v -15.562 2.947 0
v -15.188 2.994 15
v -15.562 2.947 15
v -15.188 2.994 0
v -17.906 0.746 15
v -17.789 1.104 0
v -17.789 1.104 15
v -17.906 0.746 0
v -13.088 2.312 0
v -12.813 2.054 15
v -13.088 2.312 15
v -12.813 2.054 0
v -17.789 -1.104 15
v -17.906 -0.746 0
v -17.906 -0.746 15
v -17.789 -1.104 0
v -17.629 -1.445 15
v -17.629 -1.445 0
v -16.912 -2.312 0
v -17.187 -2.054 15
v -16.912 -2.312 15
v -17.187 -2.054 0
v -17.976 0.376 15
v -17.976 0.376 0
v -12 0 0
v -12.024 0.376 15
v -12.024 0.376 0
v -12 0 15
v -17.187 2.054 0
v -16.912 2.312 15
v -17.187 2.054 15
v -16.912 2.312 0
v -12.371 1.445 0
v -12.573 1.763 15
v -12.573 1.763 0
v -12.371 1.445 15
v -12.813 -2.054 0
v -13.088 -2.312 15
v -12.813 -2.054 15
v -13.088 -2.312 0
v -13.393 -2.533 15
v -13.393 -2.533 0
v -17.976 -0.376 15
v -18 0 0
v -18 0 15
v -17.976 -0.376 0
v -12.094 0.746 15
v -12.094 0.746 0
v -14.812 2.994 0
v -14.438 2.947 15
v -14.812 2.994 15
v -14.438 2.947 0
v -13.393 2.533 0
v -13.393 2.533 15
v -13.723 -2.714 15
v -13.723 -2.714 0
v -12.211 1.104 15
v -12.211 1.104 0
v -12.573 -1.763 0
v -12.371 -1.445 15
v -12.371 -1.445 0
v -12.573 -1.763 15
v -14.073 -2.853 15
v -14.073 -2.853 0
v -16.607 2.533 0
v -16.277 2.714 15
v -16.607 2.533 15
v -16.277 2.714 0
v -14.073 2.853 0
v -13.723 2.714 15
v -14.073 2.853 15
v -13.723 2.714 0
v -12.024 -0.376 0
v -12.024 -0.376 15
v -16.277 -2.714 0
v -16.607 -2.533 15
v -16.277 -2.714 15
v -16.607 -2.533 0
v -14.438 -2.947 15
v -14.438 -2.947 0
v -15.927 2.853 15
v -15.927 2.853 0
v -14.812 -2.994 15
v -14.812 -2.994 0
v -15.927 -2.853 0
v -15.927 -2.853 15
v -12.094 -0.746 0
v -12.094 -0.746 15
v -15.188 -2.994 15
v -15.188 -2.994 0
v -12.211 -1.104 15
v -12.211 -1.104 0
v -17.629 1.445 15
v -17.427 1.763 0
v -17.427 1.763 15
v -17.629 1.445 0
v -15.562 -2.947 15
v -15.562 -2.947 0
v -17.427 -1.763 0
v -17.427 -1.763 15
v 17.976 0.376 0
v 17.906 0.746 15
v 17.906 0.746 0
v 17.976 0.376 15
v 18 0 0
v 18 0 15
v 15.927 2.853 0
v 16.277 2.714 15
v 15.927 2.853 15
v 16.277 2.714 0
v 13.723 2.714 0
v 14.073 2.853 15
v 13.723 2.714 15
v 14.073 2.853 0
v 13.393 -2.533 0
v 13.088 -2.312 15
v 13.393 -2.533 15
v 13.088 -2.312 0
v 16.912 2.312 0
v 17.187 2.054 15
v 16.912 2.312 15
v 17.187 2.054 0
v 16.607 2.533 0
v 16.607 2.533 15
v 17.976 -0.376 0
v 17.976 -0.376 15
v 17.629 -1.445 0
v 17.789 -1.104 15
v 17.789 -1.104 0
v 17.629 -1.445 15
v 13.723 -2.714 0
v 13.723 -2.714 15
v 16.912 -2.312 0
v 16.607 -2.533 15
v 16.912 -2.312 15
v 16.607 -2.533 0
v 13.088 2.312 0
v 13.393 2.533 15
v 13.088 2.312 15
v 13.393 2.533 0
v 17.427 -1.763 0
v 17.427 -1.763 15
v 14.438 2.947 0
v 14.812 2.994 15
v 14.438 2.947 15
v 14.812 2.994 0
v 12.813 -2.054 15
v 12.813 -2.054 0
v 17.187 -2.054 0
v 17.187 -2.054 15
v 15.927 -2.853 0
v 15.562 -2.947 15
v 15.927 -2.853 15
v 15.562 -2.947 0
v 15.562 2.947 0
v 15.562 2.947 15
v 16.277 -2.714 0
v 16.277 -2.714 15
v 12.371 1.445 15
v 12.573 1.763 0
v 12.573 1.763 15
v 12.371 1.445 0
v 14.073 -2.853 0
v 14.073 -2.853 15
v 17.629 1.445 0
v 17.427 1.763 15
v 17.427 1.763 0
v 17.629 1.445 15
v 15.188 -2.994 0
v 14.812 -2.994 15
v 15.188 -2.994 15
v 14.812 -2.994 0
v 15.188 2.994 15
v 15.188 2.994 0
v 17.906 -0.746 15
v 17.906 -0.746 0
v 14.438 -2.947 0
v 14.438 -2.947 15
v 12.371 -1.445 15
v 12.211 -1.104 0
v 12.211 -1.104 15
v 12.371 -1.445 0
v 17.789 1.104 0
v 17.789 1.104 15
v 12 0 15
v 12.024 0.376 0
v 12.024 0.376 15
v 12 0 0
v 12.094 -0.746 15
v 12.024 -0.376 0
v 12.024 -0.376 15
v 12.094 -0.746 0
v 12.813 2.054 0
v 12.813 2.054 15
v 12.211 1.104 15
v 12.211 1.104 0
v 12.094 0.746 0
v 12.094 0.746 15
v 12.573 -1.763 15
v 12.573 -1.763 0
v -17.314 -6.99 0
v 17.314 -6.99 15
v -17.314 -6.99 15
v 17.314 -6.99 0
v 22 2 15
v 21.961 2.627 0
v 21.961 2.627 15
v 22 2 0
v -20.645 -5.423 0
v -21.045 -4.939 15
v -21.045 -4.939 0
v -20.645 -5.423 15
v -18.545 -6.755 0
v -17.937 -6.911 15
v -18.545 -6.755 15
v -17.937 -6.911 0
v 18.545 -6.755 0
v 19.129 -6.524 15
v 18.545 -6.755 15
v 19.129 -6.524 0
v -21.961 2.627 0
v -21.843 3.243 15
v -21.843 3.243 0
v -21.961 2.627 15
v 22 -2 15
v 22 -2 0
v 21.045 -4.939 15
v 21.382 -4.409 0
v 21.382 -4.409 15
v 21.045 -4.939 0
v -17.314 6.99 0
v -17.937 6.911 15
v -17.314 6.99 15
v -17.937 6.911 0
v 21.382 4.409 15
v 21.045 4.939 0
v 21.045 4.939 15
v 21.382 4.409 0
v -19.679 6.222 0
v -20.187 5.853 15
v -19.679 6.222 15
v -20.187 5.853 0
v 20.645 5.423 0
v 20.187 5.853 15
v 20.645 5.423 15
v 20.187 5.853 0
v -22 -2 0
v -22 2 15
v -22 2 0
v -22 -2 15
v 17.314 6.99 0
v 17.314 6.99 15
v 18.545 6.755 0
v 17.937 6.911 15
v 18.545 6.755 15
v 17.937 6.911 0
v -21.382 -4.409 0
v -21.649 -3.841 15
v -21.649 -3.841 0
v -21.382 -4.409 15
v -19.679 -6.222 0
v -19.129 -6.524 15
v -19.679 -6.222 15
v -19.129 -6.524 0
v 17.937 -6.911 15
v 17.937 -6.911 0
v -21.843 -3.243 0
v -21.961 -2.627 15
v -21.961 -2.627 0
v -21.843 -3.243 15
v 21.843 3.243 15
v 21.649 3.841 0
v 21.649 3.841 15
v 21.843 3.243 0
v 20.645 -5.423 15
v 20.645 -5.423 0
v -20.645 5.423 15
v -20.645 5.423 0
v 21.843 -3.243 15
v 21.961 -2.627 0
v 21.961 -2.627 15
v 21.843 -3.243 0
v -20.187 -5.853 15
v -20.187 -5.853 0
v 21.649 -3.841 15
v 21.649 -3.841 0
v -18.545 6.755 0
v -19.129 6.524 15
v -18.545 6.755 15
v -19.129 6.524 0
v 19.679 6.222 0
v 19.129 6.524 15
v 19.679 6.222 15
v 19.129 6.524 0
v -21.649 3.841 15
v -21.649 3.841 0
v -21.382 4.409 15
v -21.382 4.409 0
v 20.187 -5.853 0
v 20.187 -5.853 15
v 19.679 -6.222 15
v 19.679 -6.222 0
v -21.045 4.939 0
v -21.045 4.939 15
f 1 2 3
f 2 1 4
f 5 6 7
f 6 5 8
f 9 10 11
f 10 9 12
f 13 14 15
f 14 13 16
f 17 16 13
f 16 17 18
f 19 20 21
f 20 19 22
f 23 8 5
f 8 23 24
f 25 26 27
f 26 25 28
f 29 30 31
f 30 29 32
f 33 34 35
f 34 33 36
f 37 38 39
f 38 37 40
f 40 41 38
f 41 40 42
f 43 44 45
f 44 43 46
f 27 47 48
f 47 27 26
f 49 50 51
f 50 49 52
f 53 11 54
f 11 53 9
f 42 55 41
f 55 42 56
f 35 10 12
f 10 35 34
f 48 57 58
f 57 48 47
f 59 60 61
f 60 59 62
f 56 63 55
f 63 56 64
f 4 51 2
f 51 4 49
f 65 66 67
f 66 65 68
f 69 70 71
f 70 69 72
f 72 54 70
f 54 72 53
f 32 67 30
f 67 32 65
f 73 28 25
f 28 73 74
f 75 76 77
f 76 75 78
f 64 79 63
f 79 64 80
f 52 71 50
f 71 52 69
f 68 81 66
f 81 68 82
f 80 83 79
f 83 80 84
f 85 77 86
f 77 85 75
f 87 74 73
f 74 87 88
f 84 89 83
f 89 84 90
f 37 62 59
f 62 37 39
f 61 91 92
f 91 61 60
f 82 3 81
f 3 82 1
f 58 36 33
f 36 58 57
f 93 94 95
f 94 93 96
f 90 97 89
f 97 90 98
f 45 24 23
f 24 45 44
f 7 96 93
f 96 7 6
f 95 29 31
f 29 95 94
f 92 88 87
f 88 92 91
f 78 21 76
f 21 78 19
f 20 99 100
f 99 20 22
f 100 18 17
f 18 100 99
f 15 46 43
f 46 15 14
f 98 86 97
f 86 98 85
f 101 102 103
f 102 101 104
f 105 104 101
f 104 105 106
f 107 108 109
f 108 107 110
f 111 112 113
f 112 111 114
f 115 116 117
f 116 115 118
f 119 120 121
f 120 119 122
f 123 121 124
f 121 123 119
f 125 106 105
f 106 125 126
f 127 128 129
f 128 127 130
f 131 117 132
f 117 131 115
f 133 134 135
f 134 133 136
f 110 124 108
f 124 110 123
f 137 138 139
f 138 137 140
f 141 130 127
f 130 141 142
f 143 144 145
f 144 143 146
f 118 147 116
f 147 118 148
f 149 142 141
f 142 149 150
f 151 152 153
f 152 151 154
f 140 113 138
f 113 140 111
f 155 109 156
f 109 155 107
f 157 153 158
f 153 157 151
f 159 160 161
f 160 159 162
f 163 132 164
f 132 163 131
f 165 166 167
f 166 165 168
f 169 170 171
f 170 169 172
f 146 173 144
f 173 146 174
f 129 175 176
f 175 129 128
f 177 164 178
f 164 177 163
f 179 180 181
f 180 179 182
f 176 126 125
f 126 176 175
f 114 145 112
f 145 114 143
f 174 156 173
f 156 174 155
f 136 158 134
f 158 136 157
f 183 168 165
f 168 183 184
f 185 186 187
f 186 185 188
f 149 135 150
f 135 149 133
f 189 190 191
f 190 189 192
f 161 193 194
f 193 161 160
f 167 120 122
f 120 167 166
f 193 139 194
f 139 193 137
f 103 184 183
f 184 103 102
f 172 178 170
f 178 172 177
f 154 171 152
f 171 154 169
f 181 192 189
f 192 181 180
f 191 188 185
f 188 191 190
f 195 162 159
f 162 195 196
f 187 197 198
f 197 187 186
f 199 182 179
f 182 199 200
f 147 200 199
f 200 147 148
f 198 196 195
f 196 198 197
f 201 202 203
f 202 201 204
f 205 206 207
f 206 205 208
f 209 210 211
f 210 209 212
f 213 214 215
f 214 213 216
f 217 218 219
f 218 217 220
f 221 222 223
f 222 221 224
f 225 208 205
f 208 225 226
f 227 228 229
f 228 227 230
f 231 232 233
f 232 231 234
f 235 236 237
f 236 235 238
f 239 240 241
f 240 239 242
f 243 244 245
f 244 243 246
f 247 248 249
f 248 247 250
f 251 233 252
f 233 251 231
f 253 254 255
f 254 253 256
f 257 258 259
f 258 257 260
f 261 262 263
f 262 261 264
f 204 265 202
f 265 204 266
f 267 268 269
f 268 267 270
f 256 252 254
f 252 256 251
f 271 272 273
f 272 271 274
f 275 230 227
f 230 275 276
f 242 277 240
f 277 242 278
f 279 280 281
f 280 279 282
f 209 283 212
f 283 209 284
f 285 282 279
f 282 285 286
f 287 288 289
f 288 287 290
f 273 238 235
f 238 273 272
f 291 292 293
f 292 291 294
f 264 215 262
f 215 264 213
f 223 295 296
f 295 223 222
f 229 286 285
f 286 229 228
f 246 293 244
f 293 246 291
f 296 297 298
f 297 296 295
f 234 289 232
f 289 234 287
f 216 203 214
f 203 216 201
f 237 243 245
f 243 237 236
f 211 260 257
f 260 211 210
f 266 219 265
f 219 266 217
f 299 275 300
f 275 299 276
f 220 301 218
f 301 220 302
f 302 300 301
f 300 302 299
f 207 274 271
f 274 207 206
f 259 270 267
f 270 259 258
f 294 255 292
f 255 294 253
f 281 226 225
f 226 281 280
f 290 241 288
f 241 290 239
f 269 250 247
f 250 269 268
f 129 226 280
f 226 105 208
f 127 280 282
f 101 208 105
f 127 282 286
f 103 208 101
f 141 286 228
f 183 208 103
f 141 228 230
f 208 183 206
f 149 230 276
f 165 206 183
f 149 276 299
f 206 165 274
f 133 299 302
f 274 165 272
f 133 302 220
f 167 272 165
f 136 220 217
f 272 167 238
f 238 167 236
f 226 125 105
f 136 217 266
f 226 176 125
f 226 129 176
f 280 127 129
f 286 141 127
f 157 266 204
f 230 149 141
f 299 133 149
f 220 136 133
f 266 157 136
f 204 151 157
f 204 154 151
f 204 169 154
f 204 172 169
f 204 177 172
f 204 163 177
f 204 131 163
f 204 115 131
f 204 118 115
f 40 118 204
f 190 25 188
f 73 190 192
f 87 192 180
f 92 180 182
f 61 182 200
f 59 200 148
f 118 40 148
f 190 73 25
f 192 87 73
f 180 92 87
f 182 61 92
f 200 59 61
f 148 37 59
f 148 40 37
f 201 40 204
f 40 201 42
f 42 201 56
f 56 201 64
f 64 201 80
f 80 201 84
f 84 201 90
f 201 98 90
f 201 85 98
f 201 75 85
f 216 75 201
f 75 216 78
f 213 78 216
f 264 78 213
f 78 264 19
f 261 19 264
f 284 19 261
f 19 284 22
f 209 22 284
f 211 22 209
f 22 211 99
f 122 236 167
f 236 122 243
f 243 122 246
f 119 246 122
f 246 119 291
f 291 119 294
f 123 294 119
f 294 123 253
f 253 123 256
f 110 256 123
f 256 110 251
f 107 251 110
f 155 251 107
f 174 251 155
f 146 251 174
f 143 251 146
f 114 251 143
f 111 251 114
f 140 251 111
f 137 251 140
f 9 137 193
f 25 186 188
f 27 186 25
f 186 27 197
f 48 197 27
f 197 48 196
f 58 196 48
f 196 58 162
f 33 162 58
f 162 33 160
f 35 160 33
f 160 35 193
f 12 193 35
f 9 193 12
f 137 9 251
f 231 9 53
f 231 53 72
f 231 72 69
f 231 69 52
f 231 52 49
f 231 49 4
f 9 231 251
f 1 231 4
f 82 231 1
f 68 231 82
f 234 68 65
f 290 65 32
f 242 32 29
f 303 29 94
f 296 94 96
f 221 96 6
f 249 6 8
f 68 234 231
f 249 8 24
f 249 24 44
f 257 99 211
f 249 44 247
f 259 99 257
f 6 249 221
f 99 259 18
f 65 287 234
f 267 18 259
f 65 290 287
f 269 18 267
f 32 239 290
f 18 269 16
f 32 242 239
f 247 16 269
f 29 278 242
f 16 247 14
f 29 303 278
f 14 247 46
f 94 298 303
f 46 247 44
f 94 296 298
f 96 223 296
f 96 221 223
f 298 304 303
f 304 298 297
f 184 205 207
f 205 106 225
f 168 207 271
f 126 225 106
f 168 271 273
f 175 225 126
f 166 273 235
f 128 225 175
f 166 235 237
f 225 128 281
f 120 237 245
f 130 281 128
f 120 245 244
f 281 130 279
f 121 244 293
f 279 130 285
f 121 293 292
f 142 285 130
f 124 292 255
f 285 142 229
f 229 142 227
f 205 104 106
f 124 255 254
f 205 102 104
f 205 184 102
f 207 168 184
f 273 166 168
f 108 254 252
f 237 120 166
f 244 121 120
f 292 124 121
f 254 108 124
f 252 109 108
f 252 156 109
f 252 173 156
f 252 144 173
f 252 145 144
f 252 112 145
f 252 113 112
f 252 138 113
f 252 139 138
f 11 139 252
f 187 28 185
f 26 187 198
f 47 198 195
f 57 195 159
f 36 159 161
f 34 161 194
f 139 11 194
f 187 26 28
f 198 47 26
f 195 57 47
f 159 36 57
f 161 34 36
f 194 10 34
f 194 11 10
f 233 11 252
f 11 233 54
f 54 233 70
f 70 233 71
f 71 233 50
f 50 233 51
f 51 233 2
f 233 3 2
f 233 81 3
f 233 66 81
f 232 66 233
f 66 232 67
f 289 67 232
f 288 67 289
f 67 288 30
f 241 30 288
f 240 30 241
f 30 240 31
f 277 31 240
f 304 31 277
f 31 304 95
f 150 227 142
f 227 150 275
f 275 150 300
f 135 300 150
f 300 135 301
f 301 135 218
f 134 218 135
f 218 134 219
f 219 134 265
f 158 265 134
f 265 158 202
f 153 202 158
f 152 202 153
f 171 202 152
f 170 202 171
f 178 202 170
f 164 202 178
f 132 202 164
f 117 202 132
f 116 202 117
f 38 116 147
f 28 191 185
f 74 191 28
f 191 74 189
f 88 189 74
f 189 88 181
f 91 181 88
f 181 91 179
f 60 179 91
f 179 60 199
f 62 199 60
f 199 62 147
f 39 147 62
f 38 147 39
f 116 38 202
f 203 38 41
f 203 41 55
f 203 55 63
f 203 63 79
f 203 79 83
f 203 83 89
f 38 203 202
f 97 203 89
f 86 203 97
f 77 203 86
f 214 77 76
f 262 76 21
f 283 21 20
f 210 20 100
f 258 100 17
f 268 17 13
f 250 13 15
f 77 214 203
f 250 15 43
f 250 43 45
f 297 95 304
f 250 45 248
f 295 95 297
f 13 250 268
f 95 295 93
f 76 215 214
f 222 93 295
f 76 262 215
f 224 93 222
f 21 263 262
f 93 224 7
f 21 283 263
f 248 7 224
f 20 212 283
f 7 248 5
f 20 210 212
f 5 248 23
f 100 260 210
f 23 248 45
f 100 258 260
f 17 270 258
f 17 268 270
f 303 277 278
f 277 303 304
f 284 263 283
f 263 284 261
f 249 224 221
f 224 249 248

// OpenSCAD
$fn = 50;


difference() {
	union() {
		hull() {
			translate(v = [-17.0000000000, 2.0000000000, 0]) {
				cylinder(h = 15, r = 5);
			}
			translate(v = [17.0000000000, 2.0000000000, 0]) {
				cylinder(h = 15, r = 5);
			}
			translate(v = [-17.0000000000, -2.0000000000, 0]) {
				cylinder(h = 15, r = 5);
			}
			translate(v = [17.0000000000, -2.0000000000, 0]) {
				cylinder(h = 15, r = 5);
			}
		}
	}
	union() {
		translate(v = [-15.0000000000, 0.0000000000, -100.0000000000]) {
			cylinder(h = 200, r = 3.0000000000);
		}
		translate(v = [-15.0000000000, 0.0000000000, -100.0000000000]) {
			cylinder(h = 200, r = 3.0000000000);
		}
		translate(v = [15.0000000000, 0.0000000000, -100.0000000000]) {
			cylinder(h = 200, r = 3.0000000000);
		}
		translate(v = [15.0000000000, 0.0000000000, -100.0000000000]) {
			cylinder(h = 200, r = 3.0000000000);
		}
	}
}
